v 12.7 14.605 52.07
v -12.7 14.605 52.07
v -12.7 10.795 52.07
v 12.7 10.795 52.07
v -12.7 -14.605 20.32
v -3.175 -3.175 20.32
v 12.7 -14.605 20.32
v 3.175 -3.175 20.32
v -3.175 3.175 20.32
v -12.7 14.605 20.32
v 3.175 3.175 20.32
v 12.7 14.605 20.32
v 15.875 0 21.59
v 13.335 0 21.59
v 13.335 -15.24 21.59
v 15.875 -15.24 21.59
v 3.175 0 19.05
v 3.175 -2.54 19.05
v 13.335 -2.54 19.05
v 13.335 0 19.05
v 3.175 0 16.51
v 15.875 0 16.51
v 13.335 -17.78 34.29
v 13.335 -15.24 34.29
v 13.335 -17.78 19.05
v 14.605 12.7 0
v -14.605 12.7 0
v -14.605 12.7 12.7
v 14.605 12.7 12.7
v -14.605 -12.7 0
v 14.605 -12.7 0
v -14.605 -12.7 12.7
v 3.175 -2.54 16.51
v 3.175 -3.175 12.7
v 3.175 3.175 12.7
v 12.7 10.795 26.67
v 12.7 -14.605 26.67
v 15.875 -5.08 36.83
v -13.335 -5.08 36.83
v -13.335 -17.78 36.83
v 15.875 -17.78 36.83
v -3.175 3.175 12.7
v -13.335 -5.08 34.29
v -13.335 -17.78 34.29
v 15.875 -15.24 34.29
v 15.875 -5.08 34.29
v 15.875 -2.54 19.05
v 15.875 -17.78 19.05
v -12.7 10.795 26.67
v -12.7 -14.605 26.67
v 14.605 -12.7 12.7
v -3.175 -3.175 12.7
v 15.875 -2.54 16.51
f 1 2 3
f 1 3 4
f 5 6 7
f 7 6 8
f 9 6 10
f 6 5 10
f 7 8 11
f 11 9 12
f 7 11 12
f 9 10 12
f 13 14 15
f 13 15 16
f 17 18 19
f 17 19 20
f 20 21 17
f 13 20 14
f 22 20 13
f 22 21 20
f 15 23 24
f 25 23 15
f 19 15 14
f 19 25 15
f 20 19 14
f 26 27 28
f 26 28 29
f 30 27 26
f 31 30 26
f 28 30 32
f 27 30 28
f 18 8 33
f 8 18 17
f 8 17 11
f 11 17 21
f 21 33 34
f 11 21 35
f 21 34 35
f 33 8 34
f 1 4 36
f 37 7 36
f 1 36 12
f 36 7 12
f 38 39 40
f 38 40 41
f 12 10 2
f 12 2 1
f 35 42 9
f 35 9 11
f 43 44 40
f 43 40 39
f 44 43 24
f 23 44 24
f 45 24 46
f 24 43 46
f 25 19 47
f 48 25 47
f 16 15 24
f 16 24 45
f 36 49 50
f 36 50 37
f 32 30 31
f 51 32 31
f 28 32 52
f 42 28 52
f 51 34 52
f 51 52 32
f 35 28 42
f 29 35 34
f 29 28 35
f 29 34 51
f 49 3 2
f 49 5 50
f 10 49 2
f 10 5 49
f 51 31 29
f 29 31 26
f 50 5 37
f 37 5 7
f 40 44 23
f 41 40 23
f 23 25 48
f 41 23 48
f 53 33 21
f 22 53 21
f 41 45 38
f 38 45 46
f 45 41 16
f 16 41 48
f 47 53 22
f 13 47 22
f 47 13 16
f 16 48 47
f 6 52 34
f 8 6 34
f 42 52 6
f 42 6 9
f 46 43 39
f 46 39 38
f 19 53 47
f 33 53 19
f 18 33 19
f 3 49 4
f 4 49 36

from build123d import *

# Parameters (mm, degrees)
F0_W      = 29.21
F0_H      = 25.4
F1_DEPTH  = 12.7
F2_W      = 6.35
F2_H      = 6.35
F3_DEPTH  = 7.62
F4_W      = 25.4
F4_H      = 29.21
F5_DEPTH  = 6.35
F6_W      = 25.4
F6_H      = 3.81
F7_DEPTH  = 25.4
F8_W      = 2.54
F8_H      = 2.54
F9_DEPTH  = 12.7
F10_W     = 2.54
F10_H     = 17.78
F11_DEPTH = 2.54
F12_W     = 2.54
F12_H     = 2.54
F13_DEPTH = 12.7
F14_W     = 29.21
F14_H     = 12.7
F15_DEPTH = 2.54


with BuildPart() as f1:
    # F0 (on Top) → F1 (new body)
    with BuildSketch(Plane.XY):
        Rectangle(F0_W, F0_H)
    extrude(amount=F1_DEPTH)

    # F2 (on face) → F3 (join)
    with BuildSketch(Plane.XY.offset(12.7)):
        Rectangle(F2_W, F2_H)
    extrude(amount=F3_DEPTH)

    # F4 (on face) → F5 (join)
    with BuildSketch(Plane.XY.offset(20.32)):
        Rectangle(F4_W, F4_H)
    extrude(amount=F5_DEPTH)

    # F6 (on face) → F7 (join)
    with BuildSketch(Plane.XY.offset(26.67)):
        with Locations((0, 12.7)):
            Rectangle(F6_W, F6_H)
    extrude(amount=F7_DEPTH)

    # F8 (on face) → F9 (join)
    with BuildSketch(Plane.YZ.offset(3.175)):
        with Locations((-1.27, 17.78)):
            Rectangle(F8_W, F8_H)
    extrude(amount=F9_DEPTH)

    # F10 (on face) → F11 (join)
    with BuildSketch(Plane.XY.offset(19.05)):
        with Locations((14.605, -8.89)):
            Rectangle(F10_W, F10_H)
    extrude(amount=F11_DEPTH)

    # F12 (on face) → F13 (join)
    with BuildSketch(Plane.XY.offset(21.59)):
        with Locations((14.605, -16.51)):
            Rectangle(F12_W, F12_H)
    extrude(amount=F13_DEPTH)

    # F14 (on face) → F15 (join)
    with BuildSketch(Plane.XY.offset(34.29)):
        with Locations((1.27, -11.43)):
            Rectangle(F14_W, F14_H)
    extrude(amount=F15_DEPTH)


solid = f1.part
